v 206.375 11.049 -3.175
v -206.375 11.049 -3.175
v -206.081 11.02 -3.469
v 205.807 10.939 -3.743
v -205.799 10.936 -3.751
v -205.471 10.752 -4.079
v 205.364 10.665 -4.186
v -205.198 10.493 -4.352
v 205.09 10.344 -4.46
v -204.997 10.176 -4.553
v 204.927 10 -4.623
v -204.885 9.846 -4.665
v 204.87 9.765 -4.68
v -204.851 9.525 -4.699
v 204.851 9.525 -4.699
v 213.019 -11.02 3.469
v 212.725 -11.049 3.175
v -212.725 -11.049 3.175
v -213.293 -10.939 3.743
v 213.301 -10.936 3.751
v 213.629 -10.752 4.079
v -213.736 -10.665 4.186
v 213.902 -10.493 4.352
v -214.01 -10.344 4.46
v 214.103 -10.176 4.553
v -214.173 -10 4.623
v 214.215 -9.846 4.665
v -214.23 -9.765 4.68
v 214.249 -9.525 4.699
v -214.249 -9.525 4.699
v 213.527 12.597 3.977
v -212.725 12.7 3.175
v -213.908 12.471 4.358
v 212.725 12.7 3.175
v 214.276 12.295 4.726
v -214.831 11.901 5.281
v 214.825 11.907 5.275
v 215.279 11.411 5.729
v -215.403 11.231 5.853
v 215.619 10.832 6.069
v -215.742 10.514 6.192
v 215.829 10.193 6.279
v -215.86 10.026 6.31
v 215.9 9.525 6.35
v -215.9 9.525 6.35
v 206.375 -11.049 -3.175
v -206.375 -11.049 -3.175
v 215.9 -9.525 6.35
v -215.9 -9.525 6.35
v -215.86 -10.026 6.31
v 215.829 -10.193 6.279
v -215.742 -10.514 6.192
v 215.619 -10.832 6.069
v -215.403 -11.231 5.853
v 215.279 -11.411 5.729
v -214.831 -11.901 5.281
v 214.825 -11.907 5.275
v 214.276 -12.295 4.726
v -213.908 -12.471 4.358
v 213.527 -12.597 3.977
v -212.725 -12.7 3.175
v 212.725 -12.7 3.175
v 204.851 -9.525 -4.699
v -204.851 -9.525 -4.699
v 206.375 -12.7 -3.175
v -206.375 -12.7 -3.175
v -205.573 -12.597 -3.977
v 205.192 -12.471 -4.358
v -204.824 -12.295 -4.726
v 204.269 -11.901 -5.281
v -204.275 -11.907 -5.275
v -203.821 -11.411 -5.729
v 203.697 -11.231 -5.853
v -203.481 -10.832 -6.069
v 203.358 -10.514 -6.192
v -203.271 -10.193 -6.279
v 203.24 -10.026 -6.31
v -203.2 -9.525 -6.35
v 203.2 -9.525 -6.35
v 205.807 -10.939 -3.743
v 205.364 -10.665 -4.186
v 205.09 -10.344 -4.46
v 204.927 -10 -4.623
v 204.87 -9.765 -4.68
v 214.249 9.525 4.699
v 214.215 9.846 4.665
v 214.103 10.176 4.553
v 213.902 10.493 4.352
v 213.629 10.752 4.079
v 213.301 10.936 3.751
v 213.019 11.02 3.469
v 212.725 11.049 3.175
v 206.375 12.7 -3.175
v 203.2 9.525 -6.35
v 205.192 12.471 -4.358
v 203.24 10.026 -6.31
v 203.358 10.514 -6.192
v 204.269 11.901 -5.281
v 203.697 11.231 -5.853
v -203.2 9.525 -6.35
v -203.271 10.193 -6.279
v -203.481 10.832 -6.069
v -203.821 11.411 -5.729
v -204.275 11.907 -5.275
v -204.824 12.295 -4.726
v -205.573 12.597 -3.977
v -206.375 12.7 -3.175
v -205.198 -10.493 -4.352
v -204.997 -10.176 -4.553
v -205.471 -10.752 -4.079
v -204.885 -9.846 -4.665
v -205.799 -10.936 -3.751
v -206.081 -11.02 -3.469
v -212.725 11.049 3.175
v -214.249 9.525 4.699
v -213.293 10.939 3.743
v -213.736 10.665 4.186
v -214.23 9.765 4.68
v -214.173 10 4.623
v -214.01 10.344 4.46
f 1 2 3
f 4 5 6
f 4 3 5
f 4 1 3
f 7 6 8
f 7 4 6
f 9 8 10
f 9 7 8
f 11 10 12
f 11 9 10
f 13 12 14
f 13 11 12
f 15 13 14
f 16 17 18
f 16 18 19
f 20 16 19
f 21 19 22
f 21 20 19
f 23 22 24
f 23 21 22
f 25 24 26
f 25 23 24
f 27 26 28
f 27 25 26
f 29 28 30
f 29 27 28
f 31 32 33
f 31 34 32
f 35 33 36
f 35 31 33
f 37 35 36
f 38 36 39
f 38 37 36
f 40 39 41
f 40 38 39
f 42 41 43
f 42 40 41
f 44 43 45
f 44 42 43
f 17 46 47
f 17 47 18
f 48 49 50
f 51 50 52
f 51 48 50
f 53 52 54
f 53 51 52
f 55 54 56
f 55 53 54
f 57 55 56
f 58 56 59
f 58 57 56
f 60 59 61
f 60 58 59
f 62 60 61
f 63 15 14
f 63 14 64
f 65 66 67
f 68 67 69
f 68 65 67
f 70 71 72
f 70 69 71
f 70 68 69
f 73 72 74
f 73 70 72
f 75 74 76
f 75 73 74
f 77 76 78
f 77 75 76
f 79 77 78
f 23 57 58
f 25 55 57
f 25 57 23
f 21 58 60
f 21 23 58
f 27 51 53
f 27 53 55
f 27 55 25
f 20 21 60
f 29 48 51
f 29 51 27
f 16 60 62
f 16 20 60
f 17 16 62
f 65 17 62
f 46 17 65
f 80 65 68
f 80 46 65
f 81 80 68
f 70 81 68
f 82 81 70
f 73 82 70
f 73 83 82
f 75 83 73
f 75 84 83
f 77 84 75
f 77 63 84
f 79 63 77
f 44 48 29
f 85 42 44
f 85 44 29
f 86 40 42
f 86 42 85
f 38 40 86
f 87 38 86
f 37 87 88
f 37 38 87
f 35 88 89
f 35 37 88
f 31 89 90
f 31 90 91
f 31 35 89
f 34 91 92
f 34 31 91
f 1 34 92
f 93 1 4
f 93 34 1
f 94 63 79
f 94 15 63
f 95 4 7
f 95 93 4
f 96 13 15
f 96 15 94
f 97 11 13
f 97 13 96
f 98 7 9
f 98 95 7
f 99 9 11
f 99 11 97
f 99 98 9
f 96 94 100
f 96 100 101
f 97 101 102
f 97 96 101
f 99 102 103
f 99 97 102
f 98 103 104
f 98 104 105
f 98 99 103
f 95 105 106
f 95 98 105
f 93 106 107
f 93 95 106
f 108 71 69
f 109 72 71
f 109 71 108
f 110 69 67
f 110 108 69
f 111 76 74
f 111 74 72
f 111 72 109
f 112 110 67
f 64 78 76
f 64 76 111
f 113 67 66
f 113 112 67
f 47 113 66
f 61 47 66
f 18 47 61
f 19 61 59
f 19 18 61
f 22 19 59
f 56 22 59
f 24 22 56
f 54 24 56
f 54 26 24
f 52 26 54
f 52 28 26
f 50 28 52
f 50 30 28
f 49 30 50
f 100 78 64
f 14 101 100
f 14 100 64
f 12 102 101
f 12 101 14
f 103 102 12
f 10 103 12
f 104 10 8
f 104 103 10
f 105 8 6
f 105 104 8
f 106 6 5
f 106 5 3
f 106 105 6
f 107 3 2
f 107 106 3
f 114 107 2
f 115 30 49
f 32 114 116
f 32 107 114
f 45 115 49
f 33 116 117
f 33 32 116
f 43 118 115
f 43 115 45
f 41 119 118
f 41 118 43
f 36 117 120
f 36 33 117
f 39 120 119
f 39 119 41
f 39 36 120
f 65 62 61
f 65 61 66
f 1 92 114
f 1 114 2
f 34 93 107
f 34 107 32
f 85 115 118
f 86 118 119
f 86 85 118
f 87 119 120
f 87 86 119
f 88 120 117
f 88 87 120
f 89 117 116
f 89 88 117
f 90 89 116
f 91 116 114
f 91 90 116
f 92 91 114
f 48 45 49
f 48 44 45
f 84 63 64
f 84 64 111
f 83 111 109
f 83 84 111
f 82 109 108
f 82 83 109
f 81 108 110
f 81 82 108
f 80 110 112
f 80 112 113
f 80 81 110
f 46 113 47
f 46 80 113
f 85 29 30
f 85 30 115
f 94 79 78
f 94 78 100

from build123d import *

# Parameters (mm, degrees)
F1_DEPTH      = 215.9
F3_DEPTH      = 12.701
F3_DEPTH_BACK = 12.701


with BuildPart() as f1:
    # F0 (on Right) → F1 (new body, symmetric)
    with BuildSketch(Plane.YZ):
        with BuildLine():
            Line((-12.7, 3.175), (-12.7, -3.175))
            ThreePointArc((-12.7, -3.175), (-11.7700640303, -5.4200640303), (-9.525, -6.35))
            Line((-9.525, -6.35), (9.525, -6.35))
            ThreePointArc((9.525, -6.35), (11.7700640303, -5.4200640303), (12.7, -3.175))
            Line((12.7, -3.175), (12.7, 3.175))
            ThreePointArc((12.7, 3.175), (11.7700640303, 5.4200640303), (9.525, 6.35))
            Line((9.525, 6.35), (-9.525, 6.35))
            ThreePointArc((-9.525, 6.35), (-11.7700640303, 5.4200640303), (-12.7, 3.175))
        make_face()
        with BuildLine():
            ThreePointArc((-11.049, 3.175), (-10.6026307345, 4.2526307345), (-9.525, 4.699))
            Line((-9.525, 4.699), (9.525, 4.699))
            ThreePointArc((9.525, 4.699), (10.6026307345, 4.2526307345), (11.049, 3.175))
            Line((11.049, 3.175), (11.049, -3.175))
            ThreePointArc((11.049, -3.175), (10.6026307345, -4.2526307345), (9.525, -4.699))
            Line((9.525, -4.699), (-9.525, -4.699))
            ThreePointArc((-9.525, -4.699), (-10.6026307345, -4.2526307345), (-11.049, -3.175))
            Line((-11.049, -3.175), (-11.049, 3.175))
        make_face(mode=Mode.SUBTRACT)
    extrude(amount=F1_DEPTH, both=True)

    # F2 (on Front) → F3 (cut, two sides)
    with BuildSketch(Plane.XZ) as f3_sk:
        Polygon((-215.9, 6.35), (-215.9, -6.35), (-203.2, -6.35), align=None)
        Polygon((203.2, -6.35), (215.9, -6.35), (215.9, 6.35), align=None)
    extrude(amount=-F3_DEPTH, mode=Mode.SUBTRACT)
    extrude(f3_sk.sketch, amount=F3_DEPTH_BACK, mode=Mode.SUBTRACT)


solid = f1.part
